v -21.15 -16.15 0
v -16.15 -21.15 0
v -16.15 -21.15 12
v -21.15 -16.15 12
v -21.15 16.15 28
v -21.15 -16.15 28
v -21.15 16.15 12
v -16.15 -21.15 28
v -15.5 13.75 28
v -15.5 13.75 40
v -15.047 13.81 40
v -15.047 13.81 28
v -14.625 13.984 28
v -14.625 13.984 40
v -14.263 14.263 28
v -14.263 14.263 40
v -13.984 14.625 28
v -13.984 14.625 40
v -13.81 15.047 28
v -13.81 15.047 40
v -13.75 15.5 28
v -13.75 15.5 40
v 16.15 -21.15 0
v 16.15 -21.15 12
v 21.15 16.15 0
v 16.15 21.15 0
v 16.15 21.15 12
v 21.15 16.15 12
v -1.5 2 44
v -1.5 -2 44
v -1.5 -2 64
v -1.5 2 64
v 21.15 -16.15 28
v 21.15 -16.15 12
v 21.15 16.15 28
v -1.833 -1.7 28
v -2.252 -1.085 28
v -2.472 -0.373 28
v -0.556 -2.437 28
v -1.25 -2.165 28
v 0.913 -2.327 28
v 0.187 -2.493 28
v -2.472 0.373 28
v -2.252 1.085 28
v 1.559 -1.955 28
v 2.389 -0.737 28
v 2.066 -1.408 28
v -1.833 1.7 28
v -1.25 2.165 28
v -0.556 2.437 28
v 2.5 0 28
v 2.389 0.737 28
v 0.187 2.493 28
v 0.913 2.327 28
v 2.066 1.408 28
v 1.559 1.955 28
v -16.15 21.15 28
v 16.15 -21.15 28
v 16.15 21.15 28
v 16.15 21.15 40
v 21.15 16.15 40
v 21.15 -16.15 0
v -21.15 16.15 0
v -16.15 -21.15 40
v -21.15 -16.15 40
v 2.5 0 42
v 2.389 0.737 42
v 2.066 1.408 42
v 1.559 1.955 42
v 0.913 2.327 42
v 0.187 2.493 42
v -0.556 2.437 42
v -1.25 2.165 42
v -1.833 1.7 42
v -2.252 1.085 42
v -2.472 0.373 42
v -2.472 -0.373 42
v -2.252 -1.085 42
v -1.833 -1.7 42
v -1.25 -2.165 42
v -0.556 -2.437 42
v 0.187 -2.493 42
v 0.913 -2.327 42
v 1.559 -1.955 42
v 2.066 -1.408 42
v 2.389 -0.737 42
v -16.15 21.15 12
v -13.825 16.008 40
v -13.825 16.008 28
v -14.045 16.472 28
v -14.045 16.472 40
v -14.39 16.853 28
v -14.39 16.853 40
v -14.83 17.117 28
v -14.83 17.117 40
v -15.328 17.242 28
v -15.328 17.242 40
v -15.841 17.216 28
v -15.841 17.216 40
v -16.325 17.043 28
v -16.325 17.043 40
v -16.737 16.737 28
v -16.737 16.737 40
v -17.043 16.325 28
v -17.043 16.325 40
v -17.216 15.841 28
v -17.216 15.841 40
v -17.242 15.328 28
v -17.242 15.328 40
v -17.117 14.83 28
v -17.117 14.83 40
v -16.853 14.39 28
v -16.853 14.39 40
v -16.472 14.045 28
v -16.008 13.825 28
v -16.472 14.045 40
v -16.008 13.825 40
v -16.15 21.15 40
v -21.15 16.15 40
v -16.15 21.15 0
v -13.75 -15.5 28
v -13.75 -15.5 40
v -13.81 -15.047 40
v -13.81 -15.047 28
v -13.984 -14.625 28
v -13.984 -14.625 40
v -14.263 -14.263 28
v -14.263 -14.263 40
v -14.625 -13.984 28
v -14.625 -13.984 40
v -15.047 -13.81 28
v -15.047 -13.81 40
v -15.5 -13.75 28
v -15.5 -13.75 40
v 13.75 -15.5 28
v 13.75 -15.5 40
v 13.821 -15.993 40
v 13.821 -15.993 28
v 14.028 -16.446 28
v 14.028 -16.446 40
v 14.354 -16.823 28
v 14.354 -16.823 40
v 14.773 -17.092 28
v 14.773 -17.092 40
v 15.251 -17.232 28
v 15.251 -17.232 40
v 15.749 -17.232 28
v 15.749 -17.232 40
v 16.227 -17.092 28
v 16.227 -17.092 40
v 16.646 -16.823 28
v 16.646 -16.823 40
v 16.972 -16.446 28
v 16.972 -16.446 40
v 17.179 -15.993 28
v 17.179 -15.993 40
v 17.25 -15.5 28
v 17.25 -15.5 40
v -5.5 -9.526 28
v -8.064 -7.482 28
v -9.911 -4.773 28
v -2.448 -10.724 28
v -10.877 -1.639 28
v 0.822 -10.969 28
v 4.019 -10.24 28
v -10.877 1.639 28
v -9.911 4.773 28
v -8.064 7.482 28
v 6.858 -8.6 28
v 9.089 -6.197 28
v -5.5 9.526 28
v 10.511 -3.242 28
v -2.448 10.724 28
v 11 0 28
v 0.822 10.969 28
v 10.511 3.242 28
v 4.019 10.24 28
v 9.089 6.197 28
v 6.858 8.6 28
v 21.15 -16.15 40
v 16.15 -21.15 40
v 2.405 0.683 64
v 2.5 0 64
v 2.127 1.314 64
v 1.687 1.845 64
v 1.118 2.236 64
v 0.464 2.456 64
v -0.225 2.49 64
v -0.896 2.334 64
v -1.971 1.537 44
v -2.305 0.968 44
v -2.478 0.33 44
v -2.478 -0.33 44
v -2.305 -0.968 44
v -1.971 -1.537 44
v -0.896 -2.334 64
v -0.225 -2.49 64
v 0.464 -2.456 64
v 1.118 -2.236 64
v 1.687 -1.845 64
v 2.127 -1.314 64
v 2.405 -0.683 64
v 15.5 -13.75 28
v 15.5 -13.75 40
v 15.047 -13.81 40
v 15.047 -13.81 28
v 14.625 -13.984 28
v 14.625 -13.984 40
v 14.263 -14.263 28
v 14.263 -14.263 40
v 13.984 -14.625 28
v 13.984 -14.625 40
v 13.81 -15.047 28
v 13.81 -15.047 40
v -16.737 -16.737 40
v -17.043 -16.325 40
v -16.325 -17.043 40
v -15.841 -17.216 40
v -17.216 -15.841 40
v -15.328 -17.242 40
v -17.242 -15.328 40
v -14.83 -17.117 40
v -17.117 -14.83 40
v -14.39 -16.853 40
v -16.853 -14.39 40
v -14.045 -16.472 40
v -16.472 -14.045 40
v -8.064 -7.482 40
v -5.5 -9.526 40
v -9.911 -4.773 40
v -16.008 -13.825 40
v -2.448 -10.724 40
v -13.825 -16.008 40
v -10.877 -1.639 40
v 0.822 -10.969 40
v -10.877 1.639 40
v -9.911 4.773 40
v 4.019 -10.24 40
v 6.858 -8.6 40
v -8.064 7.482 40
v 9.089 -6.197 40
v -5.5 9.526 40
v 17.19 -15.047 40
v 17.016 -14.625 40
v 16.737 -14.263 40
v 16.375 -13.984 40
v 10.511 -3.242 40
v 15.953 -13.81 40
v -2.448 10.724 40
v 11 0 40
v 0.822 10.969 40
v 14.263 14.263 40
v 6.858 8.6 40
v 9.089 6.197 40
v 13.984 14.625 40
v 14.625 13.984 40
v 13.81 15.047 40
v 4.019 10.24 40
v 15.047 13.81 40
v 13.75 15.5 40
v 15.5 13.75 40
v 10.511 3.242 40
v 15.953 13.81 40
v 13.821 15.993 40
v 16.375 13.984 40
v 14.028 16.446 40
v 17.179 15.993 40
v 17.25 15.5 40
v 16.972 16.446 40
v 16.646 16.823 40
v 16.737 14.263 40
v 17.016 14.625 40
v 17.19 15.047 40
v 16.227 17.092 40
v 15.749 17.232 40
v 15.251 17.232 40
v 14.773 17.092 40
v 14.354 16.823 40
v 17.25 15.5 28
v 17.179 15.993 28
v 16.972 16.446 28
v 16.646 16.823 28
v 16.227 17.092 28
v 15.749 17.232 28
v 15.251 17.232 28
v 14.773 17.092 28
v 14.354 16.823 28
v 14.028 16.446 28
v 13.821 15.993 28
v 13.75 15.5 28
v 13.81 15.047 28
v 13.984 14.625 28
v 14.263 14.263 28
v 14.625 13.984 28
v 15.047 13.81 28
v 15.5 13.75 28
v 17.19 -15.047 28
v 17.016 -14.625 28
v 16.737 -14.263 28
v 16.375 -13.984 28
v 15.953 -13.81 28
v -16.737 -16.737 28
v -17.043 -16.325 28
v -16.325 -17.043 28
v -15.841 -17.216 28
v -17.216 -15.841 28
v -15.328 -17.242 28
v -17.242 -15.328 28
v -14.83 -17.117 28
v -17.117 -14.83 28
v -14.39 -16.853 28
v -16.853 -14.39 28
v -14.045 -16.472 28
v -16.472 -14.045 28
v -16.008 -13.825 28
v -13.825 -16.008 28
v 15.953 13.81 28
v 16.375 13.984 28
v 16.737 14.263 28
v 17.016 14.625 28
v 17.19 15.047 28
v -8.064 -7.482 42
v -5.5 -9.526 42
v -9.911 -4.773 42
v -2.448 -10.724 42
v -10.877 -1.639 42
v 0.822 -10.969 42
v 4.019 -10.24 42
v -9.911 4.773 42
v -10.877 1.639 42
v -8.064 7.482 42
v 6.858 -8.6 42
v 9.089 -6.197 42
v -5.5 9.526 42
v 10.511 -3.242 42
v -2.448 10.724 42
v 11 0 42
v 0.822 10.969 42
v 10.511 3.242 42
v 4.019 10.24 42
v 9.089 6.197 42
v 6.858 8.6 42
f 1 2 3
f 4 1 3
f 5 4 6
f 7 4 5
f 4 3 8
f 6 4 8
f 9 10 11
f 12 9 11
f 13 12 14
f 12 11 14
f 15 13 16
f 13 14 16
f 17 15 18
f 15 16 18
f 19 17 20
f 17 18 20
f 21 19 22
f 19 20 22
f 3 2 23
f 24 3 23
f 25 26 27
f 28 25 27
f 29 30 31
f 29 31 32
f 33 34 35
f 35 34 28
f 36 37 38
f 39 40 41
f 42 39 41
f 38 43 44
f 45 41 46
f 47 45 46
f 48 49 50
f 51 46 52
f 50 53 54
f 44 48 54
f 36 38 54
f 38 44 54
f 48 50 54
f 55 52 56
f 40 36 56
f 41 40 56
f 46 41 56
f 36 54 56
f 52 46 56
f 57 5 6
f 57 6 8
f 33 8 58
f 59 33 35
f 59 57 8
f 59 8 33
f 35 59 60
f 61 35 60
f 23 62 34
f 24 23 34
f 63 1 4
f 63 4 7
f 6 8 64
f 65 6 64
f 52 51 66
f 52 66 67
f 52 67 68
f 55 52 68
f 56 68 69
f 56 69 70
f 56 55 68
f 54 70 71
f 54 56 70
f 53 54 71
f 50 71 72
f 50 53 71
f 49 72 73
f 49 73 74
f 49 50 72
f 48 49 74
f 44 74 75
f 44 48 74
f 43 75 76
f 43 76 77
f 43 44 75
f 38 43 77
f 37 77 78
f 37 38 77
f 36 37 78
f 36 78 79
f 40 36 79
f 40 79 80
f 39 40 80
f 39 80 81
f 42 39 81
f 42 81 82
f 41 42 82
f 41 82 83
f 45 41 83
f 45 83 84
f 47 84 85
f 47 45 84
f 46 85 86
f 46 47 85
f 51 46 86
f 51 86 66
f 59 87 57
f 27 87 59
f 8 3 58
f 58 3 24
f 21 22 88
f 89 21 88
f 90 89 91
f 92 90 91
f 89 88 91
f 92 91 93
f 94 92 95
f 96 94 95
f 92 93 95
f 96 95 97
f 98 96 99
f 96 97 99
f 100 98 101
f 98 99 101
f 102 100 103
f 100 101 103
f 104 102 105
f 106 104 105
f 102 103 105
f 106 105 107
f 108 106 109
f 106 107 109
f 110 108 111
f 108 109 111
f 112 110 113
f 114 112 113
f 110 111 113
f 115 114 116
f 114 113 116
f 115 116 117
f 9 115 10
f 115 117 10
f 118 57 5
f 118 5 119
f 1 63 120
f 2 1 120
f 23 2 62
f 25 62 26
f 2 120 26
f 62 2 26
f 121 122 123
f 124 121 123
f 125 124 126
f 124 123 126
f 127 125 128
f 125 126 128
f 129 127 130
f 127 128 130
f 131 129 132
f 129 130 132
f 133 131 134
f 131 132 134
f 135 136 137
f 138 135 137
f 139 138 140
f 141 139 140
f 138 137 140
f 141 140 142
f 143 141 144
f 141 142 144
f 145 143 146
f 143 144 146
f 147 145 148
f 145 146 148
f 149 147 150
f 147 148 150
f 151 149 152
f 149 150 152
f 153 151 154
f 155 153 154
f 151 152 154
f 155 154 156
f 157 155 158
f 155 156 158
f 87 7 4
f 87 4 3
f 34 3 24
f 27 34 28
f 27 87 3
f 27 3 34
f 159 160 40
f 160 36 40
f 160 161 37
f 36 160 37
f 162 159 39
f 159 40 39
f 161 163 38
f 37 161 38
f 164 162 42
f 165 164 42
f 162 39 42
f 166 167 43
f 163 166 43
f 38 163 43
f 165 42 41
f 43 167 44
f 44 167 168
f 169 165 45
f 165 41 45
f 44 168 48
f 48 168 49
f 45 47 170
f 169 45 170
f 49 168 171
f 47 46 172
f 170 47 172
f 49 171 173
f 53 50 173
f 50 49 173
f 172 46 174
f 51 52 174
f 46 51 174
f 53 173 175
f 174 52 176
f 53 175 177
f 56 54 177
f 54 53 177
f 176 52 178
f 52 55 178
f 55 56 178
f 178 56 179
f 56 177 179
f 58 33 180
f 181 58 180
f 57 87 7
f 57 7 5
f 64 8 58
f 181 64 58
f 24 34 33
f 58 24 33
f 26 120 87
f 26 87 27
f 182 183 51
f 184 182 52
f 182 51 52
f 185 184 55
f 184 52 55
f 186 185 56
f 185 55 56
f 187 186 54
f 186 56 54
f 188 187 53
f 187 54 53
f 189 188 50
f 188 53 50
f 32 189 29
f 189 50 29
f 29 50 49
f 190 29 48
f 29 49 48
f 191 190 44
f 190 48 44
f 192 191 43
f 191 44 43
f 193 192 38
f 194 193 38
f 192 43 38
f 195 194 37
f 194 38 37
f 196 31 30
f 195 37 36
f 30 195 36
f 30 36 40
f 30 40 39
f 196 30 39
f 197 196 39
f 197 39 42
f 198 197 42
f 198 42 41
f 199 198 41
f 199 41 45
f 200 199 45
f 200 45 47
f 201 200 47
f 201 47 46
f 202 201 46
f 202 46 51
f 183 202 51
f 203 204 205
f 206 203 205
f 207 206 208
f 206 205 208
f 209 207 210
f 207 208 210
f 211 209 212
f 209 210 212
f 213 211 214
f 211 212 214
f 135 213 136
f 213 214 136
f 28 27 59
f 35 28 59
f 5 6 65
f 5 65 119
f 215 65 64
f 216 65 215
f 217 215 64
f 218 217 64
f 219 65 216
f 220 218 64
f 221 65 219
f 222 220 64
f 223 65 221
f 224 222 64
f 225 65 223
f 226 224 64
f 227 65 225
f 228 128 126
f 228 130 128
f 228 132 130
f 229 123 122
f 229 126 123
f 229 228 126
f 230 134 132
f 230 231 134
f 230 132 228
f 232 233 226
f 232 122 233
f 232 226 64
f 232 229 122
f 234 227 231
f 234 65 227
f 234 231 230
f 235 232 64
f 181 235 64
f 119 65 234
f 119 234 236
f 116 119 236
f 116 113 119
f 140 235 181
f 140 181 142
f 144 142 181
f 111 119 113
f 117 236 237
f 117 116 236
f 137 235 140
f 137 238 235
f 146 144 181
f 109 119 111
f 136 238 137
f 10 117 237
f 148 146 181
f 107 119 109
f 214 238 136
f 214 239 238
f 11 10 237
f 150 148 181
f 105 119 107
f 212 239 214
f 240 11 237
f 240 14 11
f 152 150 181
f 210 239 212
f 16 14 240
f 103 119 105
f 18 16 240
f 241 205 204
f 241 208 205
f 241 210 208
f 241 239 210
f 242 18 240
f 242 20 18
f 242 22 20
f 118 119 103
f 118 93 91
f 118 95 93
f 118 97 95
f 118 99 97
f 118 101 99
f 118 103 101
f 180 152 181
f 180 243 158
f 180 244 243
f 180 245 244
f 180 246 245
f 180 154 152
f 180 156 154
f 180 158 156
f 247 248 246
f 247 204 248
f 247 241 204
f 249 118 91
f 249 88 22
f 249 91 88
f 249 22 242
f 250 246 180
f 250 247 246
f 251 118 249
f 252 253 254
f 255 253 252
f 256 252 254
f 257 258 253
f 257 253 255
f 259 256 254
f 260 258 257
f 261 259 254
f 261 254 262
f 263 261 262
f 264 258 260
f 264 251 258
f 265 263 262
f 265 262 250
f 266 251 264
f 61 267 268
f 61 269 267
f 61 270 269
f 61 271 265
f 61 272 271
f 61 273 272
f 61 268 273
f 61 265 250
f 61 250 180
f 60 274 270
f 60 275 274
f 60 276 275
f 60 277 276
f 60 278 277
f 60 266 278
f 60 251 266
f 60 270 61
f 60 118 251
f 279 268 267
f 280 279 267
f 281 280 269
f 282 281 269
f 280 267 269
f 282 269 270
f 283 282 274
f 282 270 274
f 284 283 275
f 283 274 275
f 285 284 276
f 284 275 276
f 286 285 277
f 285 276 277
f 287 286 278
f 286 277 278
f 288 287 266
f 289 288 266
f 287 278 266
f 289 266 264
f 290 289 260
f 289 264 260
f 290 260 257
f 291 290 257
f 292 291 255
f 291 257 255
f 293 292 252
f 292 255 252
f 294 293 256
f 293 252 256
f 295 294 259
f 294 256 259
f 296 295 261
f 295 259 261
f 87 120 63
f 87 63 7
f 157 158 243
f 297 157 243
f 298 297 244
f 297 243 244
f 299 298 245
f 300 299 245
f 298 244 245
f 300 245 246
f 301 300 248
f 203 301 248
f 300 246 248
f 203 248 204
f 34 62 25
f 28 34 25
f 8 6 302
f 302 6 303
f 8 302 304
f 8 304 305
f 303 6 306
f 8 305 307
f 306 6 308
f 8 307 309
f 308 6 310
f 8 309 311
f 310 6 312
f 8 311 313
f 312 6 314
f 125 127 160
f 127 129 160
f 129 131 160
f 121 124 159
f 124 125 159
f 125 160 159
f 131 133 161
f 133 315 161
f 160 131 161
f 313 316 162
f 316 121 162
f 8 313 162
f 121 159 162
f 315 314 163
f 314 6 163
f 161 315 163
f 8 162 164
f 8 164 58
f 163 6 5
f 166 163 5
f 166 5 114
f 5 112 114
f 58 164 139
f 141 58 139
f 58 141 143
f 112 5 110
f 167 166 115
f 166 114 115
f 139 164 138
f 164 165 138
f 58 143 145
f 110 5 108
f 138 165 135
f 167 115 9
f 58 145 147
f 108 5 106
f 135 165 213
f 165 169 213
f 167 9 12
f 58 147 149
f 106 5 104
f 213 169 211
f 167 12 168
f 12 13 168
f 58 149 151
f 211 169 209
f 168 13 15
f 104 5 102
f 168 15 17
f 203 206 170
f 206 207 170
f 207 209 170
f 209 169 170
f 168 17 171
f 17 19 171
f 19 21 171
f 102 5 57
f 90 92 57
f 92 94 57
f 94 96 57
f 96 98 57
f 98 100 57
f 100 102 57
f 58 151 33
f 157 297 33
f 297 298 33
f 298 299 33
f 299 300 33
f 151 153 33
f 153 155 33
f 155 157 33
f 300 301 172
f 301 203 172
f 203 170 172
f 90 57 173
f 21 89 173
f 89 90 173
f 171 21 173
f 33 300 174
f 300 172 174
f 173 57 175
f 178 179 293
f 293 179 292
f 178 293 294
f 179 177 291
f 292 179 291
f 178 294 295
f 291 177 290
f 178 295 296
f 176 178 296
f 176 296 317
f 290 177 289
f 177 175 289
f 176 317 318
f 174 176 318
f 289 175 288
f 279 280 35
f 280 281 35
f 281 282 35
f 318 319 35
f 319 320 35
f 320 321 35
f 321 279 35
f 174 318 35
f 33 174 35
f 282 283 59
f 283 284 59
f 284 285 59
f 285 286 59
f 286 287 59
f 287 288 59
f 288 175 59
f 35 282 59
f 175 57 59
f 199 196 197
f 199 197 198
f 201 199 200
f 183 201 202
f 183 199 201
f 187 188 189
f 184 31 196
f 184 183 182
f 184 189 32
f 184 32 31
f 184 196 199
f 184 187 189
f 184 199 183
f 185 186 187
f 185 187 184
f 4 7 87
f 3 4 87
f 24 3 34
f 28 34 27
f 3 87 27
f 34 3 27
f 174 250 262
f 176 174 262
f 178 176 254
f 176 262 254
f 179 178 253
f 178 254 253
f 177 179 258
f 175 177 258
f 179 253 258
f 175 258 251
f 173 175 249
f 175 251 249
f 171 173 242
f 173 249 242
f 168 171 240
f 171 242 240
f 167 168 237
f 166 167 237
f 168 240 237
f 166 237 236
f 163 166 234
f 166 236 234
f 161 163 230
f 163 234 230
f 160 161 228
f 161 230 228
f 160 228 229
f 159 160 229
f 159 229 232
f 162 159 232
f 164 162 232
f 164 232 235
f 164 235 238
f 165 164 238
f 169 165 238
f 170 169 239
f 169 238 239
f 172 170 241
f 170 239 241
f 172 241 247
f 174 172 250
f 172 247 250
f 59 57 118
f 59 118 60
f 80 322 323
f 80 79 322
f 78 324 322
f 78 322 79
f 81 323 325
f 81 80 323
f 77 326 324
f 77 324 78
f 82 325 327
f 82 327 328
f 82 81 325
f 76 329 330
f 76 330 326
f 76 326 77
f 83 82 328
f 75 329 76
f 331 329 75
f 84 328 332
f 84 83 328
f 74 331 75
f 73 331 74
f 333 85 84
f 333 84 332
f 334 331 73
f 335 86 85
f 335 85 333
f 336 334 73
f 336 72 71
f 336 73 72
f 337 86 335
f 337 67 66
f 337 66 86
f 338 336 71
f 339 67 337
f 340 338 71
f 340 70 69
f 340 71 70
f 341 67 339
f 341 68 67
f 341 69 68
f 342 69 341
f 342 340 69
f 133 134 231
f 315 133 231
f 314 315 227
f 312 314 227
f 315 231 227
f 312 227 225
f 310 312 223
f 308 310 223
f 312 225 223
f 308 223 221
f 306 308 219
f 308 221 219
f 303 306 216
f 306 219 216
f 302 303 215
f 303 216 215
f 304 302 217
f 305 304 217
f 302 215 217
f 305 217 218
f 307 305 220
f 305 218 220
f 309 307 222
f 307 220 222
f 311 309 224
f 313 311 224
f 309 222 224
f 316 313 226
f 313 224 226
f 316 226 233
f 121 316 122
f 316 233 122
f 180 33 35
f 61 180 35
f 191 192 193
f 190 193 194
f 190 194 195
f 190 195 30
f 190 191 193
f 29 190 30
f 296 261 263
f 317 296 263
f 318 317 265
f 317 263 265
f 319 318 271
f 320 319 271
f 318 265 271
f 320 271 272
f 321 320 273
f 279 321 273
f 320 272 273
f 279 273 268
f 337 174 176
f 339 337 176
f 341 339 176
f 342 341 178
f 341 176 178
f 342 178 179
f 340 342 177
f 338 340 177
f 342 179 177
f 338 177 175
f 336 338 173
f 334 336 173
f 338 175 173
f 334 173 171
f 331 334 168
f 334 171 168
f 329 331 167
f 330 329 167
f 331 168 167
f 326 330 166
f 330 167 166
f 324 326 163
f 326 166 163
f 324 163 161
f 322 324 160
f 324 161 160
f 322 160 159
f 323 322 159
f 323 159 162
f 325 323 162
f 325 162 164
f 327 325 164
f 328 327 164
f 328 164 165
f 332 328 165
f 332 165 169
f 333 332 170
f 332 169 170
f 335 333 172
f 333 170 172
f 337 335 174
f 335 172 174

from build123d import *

# Parameters (mm, degrees)
F0_W      = 42.3
F0_H      = 42.3
F1_DEPTH  = 12
F2_SIZE   = 5
F3_W      = 42.3
F3_H      = 42.3
F4_DEPTH  = 16
F5_SIZE   = 5
F6_W      = 42.3
F6_H      = 42.3
F7_DEPTH  = 12
F8_SIZE   = 5
F9_R      = 11
F10_DEPTH = 12
F11_R     = 11
F11_R_2   = 2.5
F12_DEPTH = 14
F13_R     = 2.5
F14_DEPTH = 36
F16_DEPTH = 20


with BuildPart() as f1:
    # F0 (on Top) → F1 (new body)
    with BuildSketch(Plane.XY):
        Rectangle(F0_W, F0_H)
    extrude(amount=F1_DEPTH)

    # F2
    f2_edges = [f1.edges().sort_by_distance(p)[0] for p in [
        (21.15, -21.15, 6),
        (21.15, 21.15, 6),
        (-21.15, -21.15, 6),
        (-21.15, 21.15, 6),
    ]]
    chamfer(f2_edges, length=F2_SIZE)


with BuildPart() as f4:
    # F3 (on face) → F4 (new body)
    with BuildSketch(Plane.XY.offset(12)):
        Rectangle(F3_W, F3_H)
    extrude(amount=F4_DEPTH)

    # F5
    f5_edges = [f4.edges().sort_by_distance(p)[0] for p in [
        (21.15, -21.15, 20),
        (21.15, 21.15, 20),
        (-21.15, -21.15, 20),
        (-21.15, 21.15, 20),
    ]]
    chamfer(f5_edges, length=F5_SIZE)


with BuildPart() as f7:
    # F6 (on face) → F7 (new body)
    with BuildSketch(Plane.XY.offset(28)):
        Rectangle(F6_W, F6_H)
    extrude(amount=F7_DEPTH)

    # F8
    f8_edges = [f7.edges().sort_by_distance(p)[0] for p in [
        (21.15, -21.15, 34),
        (21.15, 21.15, 34),
        (-21.15, 21.15, 34),
        (-21.15, -21.15, 34),
    ]]
    chamfer(f8_edges, length=F8_SIZE)

    # F9 (on face) → F10 (cut)
    with BuildSketch(Plane.XY.offset(40)):
        with BuildLine():
            Line((15.5, 15.5), (13.75, 15.5))
            ThreePointArc((13.75, 15.5), (14.2625631329, 14.2625631329), (15.5, 13.75))
            Line((15.5, 13.75), (15.5, 15.5))
        make_face()
        with BuildLine():
            ThreePointArc((17.25, 15.5), (15.5, 17.25), (13.75, 15.5))
            Line((13.75, 15.5), (15.5, 15.5))
            Line((15.5, 15.5), (15.5, 13.75))
            ThreePointArc((15.5, 13.75), (16.7374368671, 14.2625631329), (17.25, 15.5))
        make_face()
        with BuildLine():
            ThreePointArc((-15.5, 13.75), (-14.2625631329, 14.2625631329), (-13.75, 15.5))
            Line((-13.75, 15.5), (-15.5, 15.5))
            Line((-15.5, 15.5), (-15.5, 13.75))
        make_face()
        with BuildLine():
            Line((-15.5, 15.5), (-13.75, 15.5))
            ThreePointArc((-13.75, 15.5), (-16.7374368671, 16.7374368671), (-15.5, 13.75))
            Line((-15.5, 13.75), (-15.5, 15.5))
        make_face()
        with BuildLine():
            Line((15.5, -15.5), (15.5, -13.75))
            ThreePointArc((15.5, -13.75), (14.2625631329, -14.2625631329), (13.75, -15.5))
            Line((13.75, -15.5), (15.5, -15.5))
        make_face()
        with BuildLine():
            ThreePointArc((17.25, -15.5), (16.7374368671, -14.2625631329), (15.5, -13.75))
            Line((15.5, -13.75), (15.5, -15.5))
            Line((15.5, -15.5), (13.75, -15.5))
            ThreePointArc((13.75, -15.5), (15.5, -17.25), (17.25, -15.5))
        make_face()
        with BuildLine():
            ThreePointArc((-13.75, -15.5), (-14.2625631329, -14.2625631329), (-15.5, -13.75))
            Line((-15.5, -13.75), (-15.5, -15.5))
            Line((-15.5, -15.5), (-13.75, -15.5))
        make_face()
        with BuildLine():
            Line((-15.5, -15.5), (-15.5, -13.75))
            ThreePointArc((-15.5, -13.75), (-16.7374368671, -16.7374368671), (-13.75, -15.5))
            Line((-13.75, -15.5), (-15.5, -15.5))
        make_face()
        Circle(F9_R)
    extrude(amount=-F10_DEPTH, mode=Mode.SUBTRACT)


with BuildPart() as f12:
    # F11 (on face) → F12 (new body)
    with BuildSketch(Plane.XY.offset(28)):
        Circle(F11_R)
        Circle(F11_R_2, mode=Mode.SUBTRACT)
    extrude(amount=F12_DEPTH)


with BuildPart() as f14:
    # F13 (on face) → F14 (new body)
    with BuildSketch(Plane.XY.offset(28)):
        Circle(F13_R)
    extrude(amount=F14_DEPTH)

    # F15 (on face) → F16 (cut)
    with BuildSketch(Plane.XY.offset(64)):
        with BuildLine():
            Line((-1.5, -2), (-1.5, 0))
            Line((-1.5, 0), (-1.5, 2))
            ThreePointArc((-1.5, 2), (-2.5, 0), (-1.5, -2))
        make_face()
    extrude(amount=-F16_DEPTH, mode=Mode.SUBTRACT)


solid = Compound([f1.part, f4.part, f7.part, f12.part, f14.part])
